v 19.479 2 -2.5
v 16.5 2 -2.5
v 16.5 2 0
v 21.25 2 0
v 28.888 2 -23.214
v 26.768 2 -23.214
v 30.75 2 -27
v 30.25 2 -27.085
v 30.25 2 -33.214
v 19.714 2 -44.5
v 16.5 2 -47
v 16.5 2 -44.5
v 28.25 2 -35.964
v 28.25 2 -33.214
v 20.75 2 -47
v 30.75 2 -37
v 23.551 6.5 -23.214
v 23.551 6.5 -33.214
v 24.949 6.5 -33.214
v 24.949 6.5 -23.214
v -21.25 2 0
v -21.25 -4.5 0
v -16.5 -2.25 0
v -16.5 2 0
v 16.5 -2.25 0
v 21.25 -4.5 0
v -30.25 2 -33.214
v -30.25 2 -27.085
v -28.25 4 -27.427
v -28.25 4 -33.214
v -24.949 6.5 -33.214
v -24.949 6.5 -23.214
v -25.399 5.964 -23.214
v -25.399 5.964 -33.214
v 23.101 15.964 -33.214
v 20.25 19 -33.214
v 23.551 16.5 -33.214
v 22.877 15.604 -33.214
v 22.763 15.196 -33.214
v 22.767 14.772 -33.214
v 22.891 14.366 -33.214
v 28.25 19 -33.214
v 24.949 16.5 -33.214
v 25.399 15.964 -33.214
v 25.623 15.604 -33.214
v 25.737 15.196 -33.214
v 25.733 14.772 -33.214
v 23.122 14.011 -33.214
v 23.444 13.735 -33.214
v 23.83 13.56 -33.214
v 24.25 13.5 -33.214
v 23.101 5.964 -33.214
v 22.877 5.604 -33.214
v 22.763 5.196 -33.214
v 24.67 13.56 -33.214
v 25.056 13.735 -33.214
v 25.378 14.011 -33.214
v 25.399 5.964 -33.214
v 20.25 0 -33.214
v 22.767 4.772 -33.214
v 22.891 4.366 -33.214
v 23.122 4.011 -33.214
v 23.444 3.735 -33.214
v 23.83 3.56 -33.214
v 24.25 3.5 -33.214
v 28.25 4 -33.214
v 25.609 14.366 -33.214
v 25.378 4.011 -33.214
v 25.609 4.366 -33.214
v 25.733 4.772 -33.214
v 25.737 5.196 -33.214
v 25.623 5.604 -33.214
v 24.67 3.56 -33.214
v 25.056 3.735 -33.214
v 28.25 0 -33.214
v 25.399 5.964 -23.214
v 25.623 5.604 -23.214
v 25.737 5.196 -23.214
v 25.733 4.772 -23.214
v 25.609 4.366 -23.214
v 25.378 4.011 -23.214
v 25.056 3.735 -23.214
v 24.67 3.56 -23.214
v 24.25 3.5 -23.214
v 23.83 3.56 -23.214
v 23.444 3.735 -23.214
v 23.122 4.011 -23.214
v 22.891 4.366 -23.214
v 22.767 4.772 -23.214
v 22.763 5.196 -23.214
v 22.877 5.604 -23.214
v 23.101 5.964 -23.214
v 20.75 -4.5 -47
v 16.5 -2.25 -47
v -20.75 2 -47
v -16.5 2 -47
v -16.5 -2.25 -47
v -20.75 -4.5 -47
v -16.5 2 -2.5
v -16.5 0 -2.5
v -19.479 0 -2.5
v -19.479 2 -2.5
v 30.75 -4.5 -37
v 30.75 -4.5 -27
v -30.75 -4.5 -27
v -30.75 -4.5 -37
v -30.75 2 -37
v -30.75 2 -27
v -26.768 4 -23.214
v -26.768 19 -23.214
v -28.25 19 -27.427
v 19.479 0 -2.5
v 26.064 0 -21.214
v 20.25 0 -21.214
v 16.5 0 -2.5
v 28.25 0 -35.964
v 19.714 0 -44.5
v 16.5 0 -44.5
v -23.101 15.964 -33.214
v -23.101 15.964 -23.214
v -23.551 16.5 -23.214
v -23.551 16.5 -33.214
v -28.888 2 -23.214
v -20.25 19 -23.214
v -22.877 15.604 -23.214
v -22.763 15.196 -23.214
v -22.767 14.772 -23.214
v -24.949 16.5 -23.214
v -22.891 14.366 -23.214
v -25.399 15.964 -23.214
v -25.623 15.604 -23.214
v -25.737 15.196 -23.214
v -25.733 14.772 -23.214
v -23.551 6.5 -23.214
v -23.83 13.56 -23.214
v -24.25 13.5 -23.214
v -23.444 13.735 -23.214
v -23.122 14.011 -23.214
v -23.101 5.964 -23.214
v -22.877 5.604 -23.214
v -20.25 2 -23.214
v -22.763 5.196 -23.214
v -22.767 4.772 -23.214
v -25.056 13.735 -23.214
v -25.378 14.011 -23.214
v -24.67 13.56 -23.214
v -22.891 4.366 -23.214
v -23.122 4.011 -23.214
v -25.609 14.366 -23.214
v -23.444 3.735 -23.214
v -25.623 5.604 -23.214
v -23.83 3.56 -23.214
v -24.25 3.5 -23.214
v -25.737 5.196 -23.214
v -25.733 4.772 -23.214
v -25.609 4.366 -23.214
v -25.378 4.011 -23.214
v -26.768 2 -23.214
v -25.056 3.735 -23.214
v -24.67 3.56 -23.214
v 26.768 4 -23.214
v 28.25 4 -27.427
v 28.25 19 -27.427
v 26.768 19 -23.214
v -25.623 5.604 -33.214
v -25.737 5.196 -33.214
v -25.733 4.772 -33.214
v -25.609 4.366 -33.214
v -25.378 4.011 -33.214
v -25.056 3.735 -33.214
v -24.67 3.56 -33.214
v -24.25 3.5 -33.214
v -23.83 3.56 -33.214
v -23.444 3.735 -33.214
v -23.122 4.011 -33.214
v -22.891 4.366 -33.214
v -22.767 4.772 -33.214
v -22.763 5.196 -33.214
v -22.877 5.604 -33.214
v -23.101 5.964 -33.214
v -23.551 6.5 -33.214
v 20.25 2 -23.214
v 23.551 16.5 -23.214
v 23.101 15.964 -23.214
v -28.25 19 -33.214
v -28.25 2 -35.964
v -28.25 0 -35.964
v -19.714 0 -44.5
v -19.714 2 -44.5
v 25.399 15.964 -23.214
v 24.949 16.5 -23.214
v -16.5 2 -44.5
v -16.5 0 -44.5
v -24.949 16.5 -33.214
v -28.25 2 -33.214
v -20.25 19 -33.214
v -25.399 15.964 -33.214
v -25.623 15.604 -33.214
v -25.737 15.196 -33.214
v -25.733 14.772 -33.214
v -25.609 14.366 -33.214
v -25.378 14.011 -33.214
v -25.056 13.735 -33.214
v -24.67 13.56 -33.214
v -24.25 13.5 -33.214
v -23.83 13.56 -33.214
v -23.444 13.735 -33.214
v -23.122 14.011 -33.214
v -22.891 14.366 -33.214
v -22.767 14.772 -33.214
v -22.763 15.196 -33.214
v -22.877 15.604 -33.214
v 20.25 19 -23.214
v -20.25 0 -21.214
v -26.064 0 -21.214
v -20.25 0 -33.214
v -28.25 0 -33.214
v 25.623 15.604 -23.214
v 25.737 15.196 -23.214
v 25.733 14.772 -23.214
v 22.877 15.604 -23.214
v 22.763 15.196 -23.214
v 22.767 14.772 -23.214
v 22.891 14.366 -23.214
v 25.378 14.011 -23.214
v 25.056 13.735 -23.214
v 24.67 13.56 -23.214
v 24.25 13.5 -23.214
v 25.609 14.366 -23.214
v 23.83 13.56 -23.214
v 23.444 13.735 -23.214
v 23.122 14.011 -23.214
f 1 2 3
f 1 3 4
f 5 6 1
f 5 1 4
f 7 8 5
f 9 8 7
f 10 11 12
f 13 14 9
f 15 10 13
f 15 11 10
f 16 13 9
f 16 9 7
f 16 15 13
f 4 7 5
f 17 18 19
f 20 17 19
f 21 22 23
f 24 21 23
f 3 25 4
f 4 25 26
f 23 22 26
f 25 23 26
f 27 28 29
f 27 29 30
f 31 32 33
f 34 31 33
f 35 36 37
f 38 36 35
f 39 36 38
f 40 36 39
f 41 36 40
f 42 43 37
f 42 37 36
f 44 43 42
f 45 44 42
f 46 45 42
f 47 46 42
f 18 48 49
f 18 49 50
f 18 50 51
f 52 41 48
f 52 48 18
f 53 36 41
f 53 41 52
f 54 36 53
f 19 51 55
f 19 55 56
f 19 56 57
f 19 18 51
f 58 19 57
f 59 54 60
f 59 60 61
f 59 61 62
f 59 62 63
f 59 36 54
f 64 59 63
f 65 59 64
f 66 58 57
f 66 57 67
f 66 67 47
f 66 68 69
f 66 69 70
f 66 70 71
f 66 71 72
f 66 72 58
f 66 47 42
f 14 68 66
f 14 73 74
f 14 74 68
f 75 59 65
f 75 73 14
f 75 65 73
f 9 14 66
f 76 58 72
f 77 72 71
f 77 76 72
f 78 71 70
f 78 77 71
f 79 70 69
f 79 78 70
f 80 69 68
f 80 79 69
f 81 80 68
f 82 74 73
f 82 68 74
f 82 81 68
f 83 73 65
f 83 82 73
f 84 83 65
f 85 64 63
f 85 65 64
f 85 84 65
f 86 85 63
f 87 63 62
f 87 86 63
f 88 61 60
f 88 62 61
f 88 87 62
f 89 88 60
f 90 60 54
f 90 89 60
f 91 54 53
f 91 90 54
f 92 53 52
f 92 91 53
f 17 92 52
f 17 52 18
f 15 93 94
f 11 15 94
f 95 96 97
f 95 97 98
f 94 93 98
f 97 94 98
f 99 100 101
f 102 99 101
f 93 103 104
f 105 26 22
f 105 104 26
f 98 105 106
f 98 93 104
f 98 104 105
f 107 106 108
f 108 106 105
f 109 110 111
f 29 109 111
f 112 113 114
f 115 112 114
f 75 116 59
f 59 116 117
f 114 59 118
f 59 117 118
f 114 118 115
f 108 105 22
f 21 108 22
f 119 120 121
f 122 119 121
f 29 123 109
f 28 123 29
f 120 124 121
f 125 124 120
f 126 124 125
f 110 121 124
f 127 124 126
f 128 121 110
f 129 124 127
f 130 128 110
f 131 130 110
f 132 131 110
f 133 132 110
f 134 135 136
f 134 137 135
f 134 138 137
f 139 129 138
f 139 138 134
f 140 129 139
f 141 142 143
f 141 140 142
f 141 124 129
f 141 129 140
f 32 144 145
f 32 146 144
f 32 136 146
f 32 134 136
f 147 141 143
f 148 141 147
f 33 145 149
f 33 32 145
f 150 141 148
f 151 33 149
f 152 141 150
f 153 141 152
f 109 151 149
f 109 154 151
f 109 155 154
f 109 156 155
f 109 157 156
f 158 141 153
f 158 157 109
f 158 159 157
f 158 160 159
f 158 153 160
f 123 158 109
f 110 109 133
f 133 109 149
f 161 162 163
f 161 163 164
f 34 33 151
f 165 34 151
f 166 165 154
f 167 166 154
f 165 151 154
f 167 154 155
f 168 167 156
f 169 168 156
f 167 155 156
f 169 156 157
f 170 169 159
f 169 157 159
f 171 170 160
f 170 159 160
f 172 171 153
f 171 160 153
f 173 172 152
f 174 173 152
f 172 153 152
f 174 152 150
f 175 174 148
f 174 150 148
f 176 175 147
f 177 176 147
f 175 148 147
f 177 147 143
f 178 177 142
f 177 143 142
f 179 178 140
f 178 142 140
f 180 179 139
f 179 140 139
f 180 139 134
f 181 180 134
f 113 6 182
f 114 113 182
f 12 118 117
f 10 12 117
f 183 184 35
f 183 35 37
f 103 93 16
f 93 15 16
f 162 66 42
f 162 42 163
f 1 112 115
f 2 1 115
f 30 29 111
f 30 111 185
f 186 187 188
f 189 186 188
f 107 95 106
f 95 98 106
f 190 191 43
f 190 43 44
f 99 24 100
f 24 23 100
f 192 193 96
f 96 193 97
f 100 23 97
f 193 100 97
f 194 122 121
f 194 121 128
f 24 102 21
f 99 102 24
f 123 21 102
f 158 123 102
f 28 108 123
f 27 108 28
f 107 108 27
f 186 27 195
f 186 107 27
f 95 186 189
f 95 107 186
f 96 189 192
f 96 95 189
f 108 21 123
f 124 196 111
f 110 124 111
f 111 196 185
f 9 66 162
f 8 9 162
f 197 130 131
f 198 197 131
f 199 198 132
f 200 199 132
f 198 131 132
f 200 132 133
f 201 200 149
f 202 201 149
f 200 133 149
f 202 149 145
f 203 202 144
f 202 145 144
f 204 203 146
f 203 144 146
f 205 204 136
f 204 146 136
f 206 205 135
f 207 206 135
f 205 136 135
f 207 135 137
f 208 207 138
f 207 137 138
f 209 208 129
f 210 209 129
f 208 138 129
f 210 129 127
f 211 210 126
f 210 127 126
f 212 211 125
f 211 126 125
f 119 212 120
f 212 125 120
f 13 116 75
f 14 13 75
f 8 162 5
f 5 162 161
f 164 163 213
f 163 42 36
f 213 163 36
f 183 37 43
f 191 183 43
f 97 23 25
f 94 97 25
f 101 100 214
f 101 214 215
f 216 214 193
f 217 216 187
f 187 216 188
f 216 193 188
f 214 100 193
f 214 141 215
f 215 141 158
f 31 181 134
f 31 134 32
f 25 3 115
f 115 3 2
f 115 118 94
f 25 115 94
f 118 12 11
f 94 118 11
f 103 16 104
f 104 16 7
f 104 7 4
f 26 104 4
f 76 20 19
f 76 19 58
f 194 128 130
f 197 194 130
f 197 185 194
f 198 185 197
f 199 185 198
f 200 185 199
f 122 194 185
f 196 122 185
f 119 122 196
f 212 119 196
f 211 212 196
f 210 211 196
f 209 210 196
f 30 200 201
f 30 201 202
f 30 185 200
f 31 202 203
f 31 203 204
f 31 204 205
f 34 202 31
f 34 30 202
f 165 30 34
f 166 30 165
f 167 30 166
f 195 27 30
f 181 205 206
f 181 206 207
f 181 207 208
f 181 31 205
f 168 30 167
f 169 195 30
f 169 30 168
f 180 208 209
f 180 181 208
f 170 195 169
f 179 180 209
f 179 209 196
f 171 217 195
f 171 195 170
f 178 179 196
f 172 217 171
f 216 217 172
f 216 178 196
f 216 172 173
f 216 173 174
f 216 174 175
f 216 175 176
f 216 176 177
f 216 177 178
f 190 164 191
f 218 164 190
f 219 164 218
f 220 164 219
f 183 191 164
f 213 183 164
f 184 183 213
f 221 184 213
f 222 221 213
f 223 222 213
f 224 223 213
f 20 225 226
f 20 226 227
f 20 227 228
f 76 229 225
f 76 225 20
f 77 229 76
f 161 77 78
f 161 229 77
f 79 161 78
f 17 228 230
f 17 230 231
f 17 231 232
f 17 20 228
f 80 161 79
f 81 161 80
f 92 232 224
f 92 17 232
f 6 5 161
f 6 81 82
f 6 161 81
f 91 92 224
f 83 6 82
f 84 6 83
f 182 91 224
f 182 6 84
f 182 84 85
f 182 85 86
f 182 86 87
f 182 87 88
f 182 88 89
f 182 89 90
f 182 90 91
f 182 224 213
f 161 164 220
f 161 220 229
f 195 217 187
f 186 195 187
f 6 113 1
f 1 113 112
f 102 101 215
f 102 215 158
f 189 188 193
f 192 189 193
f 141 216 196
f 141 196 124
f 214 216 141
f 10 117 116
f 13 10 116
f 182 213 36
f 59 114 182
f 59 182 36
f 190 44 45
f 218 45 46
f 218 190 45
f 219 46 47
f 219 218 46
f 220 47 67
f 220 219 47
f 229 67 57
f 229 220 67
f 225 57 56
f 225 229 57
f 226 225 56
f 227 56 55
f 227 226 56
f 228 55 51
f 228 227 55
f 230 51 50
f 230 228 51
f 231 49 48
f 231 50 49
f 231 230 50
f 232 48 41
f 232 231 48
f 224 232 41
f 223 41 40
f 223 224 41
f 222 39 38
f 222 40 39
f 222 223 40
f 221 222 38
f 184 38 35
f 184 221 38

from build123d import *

# Parameters (mm, degrees)
BOSS_EXTRUDE1_DEPTH = 4.5
SKETCH2_W           = 33
SKETCH2_H           = 47
CUT_EXTRUDE1_DEPTH  = 2.25
BOSS_EXTRUDE2_DEPTH = 2
BOSS_EXTRUDE3_DEPTH = 19
CHAMFER1_SIZE       = 2
CHAMFER2_SIZE       = 2
CUT_EXTRUDE2_REACH  = 45.27


with BuildPart() as part:
    # Sketch1 → Boss-Extrude1 (new body)
    with BuildSketch(Plane(origin=(0, 0, 0), x_dir=(1, 0, 0), z_dir=(0, 1, 0))):
        Polygon((21.25, 0), (-21.25, 0), (-30.75, 27), (-30.75, 37), (-20.75, 47), (20.75, 47), (30.75, 37), (30.75, 27), align=None)
    extrude(amount=-BOSS_EXTRUDE1_DEPTH)

    # Sketch2 → Cut-Extrude1 (cut)
    with BuildSketch(Plane(origin=(0, 0, 0), x_dir=(1, 0, 0), z_dir=(0, 1, 0))):
        with Locations((0, 23.5)):
            Rectangle(SKETCH2_W, SKETCH2_H)
    extrude(amount=-CUT_EXTRUDE1_DEPTH, mode=Mode.SUBTRACT)

    # Sketch3 → Boss-Extrude2 (add)
    with BuildSketch(Plane(origin=(0, 0, 0), x_dir=(1, 0, 0), z_dir=(0, 1, 0))):
        Polygon((-21.25, 0), (-16.5, 0), (-16.5, 2.5), (-19.479394115, 2.5), (-28.25, 27.426985148), (-28.25, 35.964466094), (-19.714466094, 44.5), (-16.5, 44.5), (-16.5, 47), (-20.75, 47), (-30.75, 37), (-30.75, 27), align=None)
        Polygon((16.5, 0), (21.25, 0), (30.75, 27), (30.75, 37), (20.75, 47), (16.5, 47), (16.5, 44.5), (19.714466094, 44.5), (28.25, 35.964466094), (28.25, 27.426985148), (19.479394115, 2.5), (16.5, 2.5), align=None)
    extrude(amount=BOSS_EXTRUDE2_DEPTH)

    # Sketch4 → Boss-Extrude3 (add)
    with BuildSketch(Plane(origin=(0, 0, 0), x_dir=(1, 0, 0), z_dir=(0, 1, 0))):
        Polygon((-20.25, 33.214466094), (-20.25, 23.214466094), (-26.76781737, 23.214466094), (-28.25, 27.426985148), (-28.25, 33.214466094), align=None)
        Polygon((20.25, 23.214466094), (20.25, 33.214466094), (28.25, 33.214466094), (28.25, 27.426985148), (26.76781737, 23.214466094), align=None)
    extrude(amount=BOSS_EXTRUDE3_DEPTH)

    # Chamfer1
    chamfer1_edges = [part.edges().sort_by_distance(p)[0] for p in [
        (-27.508908685, 2, -25.320725621),
        (28.25, 2, -30.320725621),
        (-28.25, 2, -30.320725621),
        (27.508908685, 2, -25.320725621),
    ]]
    chamfer(chamfer1_edges, length=CHAMFER1_SIZE)

    # Chamfer2
    chamfer2_edges = [part.edges().sort_by_distance(p)[0] for p in [
        (23.508908685, 0, -23.214466094),
        (-23.508908685, 0, -23.214466094),
    ]]
    chamfer(chamfer2_edges, length=CHAMFER2_SIZE)

    # Sketch5 → Cut-Extrude2 (cut, up to next)
    with BuildSketch(Plane.XY.offset(-23.214466094), mode=Mode.PRIVATE) as cut_extrude2_sk1:
        with BuildLine():
            Line((-24.949461487, 16.5), (-25.399066665, 15.964181415))
            ThreePointArc((-25.399066665, 15.964181415), (-24.25, 13.5), (-23.100933335, 15.964181415))
            Line((-23.100933335, 15.964181415), (-23.550538513, 16.5))
            Line((-23.550538513, 16.5), (-24.949461487, 16.5))
        make_face()
    cut_extrude2_tool1 = extrude(cut_extrude2_sk1.sketch, amount=-CUT_EXTRUDE2_REACH, mode=Mode.PRIVATE) & part.part
    # Sketch5 → Cut-Extrude2 (cut, up to next)
    with BuildSketch(Plane.XY.offset(-23.214466094), mode=Mode.PRIVATE) as cut_extrude2_sk2:
        with BuildLine():
            Line((-23.100933335, 5.964181415), (-23.550538513, 6.5))
            Line((-23.550538513, 6.5), (-24.949461487, 6.5))
            Line((-24.949461487, 6.5), (-25.399066665, 5.964181415))
            ThreePointArc((-25.399066665, 5.964181415), (-24.25, 3.5), (-23.100933335, 5.964181415))
        make_face()
    cut_extrude2_tool2 = extrude(cut_extrude2_sk2.sketch, amount=-CUT_EXTRUDE2_REACH, mode=Mode.PRIVATE) & part.part
    # Sketch5 → Cut-Extrude2 (cut, up to next)
    with BuildSketch(Plane.XY.offset(-23.214466094), mode=Mode.PRIVATE) as cut_extrude2_sk3:
        with BuildLine():
            Line((23.100933335, 5.964181415), (23.550538513, 6.5))
            Line((23.550538513, 6.5), (24.949461487, 6.5))
            Line((24.949461487, 6.5), (25.399066665, 5.964181415))
            ThreePointArc((25.399066665, 5.964181415), (24.25, 3.5), (23.100933335, 5.964181415))
        make_face()
    cut_extrude2_tool3 = extrude(cut_extrude2_sk3.sketch, amount=-CUT_EXTRUDE2_REACH, mode=Mode.PRIVATE) & part.part
    # Sketch5 → Cut-Extrude2 (cut, up to next)
    with BuildSketch(Plane.XY.offset(-23.214466094), mode=Mode.PRIVATE) as cut_extrude2_sk4:
        with BuildLine():
            Line((24.949461487, 16.5), (25.399066665, 15.964181415))
            ThreePointArc((25.399066665, 15.964181415), (24.25, 13.5), (23.100933335, 15.964181415))
            Line((23.100933335, 15.964181415), (23.550538513, 16.5))
            Line((23.550538513, 16.5), (24.949461487, 16.5))
        make_face()
    cut_extrude2_tool4 = extrude(cut_extrude2_sk4.sketch, amount=-CUT_EXTRUDE2_REACH, mode=Mode.PRIVATE) & part.part
    add(cut_extrude2_tool1.solids().sort_by_distance((-24.25, 15.026014, -23.214466))[0], mode=Mode.SUBTRACT)
    add(cut_extrude2_tool2.solids().sort_by_distance((-24.25, 5.026014, -23.214466))[0], mode=Mode.SUBTRACT)
    add(cut_extrude2_tool3.solids().sort_by_distance((24.25, 5.026014, -23.214466))[0], mode=Mode.SUBTRACT)
    add(cut_extrude2_tool4.solids().sort_by_distance((24.25, 15.026014, -23.214466))[0], mode=Mode.SUBTRACT)


solid = part.part
